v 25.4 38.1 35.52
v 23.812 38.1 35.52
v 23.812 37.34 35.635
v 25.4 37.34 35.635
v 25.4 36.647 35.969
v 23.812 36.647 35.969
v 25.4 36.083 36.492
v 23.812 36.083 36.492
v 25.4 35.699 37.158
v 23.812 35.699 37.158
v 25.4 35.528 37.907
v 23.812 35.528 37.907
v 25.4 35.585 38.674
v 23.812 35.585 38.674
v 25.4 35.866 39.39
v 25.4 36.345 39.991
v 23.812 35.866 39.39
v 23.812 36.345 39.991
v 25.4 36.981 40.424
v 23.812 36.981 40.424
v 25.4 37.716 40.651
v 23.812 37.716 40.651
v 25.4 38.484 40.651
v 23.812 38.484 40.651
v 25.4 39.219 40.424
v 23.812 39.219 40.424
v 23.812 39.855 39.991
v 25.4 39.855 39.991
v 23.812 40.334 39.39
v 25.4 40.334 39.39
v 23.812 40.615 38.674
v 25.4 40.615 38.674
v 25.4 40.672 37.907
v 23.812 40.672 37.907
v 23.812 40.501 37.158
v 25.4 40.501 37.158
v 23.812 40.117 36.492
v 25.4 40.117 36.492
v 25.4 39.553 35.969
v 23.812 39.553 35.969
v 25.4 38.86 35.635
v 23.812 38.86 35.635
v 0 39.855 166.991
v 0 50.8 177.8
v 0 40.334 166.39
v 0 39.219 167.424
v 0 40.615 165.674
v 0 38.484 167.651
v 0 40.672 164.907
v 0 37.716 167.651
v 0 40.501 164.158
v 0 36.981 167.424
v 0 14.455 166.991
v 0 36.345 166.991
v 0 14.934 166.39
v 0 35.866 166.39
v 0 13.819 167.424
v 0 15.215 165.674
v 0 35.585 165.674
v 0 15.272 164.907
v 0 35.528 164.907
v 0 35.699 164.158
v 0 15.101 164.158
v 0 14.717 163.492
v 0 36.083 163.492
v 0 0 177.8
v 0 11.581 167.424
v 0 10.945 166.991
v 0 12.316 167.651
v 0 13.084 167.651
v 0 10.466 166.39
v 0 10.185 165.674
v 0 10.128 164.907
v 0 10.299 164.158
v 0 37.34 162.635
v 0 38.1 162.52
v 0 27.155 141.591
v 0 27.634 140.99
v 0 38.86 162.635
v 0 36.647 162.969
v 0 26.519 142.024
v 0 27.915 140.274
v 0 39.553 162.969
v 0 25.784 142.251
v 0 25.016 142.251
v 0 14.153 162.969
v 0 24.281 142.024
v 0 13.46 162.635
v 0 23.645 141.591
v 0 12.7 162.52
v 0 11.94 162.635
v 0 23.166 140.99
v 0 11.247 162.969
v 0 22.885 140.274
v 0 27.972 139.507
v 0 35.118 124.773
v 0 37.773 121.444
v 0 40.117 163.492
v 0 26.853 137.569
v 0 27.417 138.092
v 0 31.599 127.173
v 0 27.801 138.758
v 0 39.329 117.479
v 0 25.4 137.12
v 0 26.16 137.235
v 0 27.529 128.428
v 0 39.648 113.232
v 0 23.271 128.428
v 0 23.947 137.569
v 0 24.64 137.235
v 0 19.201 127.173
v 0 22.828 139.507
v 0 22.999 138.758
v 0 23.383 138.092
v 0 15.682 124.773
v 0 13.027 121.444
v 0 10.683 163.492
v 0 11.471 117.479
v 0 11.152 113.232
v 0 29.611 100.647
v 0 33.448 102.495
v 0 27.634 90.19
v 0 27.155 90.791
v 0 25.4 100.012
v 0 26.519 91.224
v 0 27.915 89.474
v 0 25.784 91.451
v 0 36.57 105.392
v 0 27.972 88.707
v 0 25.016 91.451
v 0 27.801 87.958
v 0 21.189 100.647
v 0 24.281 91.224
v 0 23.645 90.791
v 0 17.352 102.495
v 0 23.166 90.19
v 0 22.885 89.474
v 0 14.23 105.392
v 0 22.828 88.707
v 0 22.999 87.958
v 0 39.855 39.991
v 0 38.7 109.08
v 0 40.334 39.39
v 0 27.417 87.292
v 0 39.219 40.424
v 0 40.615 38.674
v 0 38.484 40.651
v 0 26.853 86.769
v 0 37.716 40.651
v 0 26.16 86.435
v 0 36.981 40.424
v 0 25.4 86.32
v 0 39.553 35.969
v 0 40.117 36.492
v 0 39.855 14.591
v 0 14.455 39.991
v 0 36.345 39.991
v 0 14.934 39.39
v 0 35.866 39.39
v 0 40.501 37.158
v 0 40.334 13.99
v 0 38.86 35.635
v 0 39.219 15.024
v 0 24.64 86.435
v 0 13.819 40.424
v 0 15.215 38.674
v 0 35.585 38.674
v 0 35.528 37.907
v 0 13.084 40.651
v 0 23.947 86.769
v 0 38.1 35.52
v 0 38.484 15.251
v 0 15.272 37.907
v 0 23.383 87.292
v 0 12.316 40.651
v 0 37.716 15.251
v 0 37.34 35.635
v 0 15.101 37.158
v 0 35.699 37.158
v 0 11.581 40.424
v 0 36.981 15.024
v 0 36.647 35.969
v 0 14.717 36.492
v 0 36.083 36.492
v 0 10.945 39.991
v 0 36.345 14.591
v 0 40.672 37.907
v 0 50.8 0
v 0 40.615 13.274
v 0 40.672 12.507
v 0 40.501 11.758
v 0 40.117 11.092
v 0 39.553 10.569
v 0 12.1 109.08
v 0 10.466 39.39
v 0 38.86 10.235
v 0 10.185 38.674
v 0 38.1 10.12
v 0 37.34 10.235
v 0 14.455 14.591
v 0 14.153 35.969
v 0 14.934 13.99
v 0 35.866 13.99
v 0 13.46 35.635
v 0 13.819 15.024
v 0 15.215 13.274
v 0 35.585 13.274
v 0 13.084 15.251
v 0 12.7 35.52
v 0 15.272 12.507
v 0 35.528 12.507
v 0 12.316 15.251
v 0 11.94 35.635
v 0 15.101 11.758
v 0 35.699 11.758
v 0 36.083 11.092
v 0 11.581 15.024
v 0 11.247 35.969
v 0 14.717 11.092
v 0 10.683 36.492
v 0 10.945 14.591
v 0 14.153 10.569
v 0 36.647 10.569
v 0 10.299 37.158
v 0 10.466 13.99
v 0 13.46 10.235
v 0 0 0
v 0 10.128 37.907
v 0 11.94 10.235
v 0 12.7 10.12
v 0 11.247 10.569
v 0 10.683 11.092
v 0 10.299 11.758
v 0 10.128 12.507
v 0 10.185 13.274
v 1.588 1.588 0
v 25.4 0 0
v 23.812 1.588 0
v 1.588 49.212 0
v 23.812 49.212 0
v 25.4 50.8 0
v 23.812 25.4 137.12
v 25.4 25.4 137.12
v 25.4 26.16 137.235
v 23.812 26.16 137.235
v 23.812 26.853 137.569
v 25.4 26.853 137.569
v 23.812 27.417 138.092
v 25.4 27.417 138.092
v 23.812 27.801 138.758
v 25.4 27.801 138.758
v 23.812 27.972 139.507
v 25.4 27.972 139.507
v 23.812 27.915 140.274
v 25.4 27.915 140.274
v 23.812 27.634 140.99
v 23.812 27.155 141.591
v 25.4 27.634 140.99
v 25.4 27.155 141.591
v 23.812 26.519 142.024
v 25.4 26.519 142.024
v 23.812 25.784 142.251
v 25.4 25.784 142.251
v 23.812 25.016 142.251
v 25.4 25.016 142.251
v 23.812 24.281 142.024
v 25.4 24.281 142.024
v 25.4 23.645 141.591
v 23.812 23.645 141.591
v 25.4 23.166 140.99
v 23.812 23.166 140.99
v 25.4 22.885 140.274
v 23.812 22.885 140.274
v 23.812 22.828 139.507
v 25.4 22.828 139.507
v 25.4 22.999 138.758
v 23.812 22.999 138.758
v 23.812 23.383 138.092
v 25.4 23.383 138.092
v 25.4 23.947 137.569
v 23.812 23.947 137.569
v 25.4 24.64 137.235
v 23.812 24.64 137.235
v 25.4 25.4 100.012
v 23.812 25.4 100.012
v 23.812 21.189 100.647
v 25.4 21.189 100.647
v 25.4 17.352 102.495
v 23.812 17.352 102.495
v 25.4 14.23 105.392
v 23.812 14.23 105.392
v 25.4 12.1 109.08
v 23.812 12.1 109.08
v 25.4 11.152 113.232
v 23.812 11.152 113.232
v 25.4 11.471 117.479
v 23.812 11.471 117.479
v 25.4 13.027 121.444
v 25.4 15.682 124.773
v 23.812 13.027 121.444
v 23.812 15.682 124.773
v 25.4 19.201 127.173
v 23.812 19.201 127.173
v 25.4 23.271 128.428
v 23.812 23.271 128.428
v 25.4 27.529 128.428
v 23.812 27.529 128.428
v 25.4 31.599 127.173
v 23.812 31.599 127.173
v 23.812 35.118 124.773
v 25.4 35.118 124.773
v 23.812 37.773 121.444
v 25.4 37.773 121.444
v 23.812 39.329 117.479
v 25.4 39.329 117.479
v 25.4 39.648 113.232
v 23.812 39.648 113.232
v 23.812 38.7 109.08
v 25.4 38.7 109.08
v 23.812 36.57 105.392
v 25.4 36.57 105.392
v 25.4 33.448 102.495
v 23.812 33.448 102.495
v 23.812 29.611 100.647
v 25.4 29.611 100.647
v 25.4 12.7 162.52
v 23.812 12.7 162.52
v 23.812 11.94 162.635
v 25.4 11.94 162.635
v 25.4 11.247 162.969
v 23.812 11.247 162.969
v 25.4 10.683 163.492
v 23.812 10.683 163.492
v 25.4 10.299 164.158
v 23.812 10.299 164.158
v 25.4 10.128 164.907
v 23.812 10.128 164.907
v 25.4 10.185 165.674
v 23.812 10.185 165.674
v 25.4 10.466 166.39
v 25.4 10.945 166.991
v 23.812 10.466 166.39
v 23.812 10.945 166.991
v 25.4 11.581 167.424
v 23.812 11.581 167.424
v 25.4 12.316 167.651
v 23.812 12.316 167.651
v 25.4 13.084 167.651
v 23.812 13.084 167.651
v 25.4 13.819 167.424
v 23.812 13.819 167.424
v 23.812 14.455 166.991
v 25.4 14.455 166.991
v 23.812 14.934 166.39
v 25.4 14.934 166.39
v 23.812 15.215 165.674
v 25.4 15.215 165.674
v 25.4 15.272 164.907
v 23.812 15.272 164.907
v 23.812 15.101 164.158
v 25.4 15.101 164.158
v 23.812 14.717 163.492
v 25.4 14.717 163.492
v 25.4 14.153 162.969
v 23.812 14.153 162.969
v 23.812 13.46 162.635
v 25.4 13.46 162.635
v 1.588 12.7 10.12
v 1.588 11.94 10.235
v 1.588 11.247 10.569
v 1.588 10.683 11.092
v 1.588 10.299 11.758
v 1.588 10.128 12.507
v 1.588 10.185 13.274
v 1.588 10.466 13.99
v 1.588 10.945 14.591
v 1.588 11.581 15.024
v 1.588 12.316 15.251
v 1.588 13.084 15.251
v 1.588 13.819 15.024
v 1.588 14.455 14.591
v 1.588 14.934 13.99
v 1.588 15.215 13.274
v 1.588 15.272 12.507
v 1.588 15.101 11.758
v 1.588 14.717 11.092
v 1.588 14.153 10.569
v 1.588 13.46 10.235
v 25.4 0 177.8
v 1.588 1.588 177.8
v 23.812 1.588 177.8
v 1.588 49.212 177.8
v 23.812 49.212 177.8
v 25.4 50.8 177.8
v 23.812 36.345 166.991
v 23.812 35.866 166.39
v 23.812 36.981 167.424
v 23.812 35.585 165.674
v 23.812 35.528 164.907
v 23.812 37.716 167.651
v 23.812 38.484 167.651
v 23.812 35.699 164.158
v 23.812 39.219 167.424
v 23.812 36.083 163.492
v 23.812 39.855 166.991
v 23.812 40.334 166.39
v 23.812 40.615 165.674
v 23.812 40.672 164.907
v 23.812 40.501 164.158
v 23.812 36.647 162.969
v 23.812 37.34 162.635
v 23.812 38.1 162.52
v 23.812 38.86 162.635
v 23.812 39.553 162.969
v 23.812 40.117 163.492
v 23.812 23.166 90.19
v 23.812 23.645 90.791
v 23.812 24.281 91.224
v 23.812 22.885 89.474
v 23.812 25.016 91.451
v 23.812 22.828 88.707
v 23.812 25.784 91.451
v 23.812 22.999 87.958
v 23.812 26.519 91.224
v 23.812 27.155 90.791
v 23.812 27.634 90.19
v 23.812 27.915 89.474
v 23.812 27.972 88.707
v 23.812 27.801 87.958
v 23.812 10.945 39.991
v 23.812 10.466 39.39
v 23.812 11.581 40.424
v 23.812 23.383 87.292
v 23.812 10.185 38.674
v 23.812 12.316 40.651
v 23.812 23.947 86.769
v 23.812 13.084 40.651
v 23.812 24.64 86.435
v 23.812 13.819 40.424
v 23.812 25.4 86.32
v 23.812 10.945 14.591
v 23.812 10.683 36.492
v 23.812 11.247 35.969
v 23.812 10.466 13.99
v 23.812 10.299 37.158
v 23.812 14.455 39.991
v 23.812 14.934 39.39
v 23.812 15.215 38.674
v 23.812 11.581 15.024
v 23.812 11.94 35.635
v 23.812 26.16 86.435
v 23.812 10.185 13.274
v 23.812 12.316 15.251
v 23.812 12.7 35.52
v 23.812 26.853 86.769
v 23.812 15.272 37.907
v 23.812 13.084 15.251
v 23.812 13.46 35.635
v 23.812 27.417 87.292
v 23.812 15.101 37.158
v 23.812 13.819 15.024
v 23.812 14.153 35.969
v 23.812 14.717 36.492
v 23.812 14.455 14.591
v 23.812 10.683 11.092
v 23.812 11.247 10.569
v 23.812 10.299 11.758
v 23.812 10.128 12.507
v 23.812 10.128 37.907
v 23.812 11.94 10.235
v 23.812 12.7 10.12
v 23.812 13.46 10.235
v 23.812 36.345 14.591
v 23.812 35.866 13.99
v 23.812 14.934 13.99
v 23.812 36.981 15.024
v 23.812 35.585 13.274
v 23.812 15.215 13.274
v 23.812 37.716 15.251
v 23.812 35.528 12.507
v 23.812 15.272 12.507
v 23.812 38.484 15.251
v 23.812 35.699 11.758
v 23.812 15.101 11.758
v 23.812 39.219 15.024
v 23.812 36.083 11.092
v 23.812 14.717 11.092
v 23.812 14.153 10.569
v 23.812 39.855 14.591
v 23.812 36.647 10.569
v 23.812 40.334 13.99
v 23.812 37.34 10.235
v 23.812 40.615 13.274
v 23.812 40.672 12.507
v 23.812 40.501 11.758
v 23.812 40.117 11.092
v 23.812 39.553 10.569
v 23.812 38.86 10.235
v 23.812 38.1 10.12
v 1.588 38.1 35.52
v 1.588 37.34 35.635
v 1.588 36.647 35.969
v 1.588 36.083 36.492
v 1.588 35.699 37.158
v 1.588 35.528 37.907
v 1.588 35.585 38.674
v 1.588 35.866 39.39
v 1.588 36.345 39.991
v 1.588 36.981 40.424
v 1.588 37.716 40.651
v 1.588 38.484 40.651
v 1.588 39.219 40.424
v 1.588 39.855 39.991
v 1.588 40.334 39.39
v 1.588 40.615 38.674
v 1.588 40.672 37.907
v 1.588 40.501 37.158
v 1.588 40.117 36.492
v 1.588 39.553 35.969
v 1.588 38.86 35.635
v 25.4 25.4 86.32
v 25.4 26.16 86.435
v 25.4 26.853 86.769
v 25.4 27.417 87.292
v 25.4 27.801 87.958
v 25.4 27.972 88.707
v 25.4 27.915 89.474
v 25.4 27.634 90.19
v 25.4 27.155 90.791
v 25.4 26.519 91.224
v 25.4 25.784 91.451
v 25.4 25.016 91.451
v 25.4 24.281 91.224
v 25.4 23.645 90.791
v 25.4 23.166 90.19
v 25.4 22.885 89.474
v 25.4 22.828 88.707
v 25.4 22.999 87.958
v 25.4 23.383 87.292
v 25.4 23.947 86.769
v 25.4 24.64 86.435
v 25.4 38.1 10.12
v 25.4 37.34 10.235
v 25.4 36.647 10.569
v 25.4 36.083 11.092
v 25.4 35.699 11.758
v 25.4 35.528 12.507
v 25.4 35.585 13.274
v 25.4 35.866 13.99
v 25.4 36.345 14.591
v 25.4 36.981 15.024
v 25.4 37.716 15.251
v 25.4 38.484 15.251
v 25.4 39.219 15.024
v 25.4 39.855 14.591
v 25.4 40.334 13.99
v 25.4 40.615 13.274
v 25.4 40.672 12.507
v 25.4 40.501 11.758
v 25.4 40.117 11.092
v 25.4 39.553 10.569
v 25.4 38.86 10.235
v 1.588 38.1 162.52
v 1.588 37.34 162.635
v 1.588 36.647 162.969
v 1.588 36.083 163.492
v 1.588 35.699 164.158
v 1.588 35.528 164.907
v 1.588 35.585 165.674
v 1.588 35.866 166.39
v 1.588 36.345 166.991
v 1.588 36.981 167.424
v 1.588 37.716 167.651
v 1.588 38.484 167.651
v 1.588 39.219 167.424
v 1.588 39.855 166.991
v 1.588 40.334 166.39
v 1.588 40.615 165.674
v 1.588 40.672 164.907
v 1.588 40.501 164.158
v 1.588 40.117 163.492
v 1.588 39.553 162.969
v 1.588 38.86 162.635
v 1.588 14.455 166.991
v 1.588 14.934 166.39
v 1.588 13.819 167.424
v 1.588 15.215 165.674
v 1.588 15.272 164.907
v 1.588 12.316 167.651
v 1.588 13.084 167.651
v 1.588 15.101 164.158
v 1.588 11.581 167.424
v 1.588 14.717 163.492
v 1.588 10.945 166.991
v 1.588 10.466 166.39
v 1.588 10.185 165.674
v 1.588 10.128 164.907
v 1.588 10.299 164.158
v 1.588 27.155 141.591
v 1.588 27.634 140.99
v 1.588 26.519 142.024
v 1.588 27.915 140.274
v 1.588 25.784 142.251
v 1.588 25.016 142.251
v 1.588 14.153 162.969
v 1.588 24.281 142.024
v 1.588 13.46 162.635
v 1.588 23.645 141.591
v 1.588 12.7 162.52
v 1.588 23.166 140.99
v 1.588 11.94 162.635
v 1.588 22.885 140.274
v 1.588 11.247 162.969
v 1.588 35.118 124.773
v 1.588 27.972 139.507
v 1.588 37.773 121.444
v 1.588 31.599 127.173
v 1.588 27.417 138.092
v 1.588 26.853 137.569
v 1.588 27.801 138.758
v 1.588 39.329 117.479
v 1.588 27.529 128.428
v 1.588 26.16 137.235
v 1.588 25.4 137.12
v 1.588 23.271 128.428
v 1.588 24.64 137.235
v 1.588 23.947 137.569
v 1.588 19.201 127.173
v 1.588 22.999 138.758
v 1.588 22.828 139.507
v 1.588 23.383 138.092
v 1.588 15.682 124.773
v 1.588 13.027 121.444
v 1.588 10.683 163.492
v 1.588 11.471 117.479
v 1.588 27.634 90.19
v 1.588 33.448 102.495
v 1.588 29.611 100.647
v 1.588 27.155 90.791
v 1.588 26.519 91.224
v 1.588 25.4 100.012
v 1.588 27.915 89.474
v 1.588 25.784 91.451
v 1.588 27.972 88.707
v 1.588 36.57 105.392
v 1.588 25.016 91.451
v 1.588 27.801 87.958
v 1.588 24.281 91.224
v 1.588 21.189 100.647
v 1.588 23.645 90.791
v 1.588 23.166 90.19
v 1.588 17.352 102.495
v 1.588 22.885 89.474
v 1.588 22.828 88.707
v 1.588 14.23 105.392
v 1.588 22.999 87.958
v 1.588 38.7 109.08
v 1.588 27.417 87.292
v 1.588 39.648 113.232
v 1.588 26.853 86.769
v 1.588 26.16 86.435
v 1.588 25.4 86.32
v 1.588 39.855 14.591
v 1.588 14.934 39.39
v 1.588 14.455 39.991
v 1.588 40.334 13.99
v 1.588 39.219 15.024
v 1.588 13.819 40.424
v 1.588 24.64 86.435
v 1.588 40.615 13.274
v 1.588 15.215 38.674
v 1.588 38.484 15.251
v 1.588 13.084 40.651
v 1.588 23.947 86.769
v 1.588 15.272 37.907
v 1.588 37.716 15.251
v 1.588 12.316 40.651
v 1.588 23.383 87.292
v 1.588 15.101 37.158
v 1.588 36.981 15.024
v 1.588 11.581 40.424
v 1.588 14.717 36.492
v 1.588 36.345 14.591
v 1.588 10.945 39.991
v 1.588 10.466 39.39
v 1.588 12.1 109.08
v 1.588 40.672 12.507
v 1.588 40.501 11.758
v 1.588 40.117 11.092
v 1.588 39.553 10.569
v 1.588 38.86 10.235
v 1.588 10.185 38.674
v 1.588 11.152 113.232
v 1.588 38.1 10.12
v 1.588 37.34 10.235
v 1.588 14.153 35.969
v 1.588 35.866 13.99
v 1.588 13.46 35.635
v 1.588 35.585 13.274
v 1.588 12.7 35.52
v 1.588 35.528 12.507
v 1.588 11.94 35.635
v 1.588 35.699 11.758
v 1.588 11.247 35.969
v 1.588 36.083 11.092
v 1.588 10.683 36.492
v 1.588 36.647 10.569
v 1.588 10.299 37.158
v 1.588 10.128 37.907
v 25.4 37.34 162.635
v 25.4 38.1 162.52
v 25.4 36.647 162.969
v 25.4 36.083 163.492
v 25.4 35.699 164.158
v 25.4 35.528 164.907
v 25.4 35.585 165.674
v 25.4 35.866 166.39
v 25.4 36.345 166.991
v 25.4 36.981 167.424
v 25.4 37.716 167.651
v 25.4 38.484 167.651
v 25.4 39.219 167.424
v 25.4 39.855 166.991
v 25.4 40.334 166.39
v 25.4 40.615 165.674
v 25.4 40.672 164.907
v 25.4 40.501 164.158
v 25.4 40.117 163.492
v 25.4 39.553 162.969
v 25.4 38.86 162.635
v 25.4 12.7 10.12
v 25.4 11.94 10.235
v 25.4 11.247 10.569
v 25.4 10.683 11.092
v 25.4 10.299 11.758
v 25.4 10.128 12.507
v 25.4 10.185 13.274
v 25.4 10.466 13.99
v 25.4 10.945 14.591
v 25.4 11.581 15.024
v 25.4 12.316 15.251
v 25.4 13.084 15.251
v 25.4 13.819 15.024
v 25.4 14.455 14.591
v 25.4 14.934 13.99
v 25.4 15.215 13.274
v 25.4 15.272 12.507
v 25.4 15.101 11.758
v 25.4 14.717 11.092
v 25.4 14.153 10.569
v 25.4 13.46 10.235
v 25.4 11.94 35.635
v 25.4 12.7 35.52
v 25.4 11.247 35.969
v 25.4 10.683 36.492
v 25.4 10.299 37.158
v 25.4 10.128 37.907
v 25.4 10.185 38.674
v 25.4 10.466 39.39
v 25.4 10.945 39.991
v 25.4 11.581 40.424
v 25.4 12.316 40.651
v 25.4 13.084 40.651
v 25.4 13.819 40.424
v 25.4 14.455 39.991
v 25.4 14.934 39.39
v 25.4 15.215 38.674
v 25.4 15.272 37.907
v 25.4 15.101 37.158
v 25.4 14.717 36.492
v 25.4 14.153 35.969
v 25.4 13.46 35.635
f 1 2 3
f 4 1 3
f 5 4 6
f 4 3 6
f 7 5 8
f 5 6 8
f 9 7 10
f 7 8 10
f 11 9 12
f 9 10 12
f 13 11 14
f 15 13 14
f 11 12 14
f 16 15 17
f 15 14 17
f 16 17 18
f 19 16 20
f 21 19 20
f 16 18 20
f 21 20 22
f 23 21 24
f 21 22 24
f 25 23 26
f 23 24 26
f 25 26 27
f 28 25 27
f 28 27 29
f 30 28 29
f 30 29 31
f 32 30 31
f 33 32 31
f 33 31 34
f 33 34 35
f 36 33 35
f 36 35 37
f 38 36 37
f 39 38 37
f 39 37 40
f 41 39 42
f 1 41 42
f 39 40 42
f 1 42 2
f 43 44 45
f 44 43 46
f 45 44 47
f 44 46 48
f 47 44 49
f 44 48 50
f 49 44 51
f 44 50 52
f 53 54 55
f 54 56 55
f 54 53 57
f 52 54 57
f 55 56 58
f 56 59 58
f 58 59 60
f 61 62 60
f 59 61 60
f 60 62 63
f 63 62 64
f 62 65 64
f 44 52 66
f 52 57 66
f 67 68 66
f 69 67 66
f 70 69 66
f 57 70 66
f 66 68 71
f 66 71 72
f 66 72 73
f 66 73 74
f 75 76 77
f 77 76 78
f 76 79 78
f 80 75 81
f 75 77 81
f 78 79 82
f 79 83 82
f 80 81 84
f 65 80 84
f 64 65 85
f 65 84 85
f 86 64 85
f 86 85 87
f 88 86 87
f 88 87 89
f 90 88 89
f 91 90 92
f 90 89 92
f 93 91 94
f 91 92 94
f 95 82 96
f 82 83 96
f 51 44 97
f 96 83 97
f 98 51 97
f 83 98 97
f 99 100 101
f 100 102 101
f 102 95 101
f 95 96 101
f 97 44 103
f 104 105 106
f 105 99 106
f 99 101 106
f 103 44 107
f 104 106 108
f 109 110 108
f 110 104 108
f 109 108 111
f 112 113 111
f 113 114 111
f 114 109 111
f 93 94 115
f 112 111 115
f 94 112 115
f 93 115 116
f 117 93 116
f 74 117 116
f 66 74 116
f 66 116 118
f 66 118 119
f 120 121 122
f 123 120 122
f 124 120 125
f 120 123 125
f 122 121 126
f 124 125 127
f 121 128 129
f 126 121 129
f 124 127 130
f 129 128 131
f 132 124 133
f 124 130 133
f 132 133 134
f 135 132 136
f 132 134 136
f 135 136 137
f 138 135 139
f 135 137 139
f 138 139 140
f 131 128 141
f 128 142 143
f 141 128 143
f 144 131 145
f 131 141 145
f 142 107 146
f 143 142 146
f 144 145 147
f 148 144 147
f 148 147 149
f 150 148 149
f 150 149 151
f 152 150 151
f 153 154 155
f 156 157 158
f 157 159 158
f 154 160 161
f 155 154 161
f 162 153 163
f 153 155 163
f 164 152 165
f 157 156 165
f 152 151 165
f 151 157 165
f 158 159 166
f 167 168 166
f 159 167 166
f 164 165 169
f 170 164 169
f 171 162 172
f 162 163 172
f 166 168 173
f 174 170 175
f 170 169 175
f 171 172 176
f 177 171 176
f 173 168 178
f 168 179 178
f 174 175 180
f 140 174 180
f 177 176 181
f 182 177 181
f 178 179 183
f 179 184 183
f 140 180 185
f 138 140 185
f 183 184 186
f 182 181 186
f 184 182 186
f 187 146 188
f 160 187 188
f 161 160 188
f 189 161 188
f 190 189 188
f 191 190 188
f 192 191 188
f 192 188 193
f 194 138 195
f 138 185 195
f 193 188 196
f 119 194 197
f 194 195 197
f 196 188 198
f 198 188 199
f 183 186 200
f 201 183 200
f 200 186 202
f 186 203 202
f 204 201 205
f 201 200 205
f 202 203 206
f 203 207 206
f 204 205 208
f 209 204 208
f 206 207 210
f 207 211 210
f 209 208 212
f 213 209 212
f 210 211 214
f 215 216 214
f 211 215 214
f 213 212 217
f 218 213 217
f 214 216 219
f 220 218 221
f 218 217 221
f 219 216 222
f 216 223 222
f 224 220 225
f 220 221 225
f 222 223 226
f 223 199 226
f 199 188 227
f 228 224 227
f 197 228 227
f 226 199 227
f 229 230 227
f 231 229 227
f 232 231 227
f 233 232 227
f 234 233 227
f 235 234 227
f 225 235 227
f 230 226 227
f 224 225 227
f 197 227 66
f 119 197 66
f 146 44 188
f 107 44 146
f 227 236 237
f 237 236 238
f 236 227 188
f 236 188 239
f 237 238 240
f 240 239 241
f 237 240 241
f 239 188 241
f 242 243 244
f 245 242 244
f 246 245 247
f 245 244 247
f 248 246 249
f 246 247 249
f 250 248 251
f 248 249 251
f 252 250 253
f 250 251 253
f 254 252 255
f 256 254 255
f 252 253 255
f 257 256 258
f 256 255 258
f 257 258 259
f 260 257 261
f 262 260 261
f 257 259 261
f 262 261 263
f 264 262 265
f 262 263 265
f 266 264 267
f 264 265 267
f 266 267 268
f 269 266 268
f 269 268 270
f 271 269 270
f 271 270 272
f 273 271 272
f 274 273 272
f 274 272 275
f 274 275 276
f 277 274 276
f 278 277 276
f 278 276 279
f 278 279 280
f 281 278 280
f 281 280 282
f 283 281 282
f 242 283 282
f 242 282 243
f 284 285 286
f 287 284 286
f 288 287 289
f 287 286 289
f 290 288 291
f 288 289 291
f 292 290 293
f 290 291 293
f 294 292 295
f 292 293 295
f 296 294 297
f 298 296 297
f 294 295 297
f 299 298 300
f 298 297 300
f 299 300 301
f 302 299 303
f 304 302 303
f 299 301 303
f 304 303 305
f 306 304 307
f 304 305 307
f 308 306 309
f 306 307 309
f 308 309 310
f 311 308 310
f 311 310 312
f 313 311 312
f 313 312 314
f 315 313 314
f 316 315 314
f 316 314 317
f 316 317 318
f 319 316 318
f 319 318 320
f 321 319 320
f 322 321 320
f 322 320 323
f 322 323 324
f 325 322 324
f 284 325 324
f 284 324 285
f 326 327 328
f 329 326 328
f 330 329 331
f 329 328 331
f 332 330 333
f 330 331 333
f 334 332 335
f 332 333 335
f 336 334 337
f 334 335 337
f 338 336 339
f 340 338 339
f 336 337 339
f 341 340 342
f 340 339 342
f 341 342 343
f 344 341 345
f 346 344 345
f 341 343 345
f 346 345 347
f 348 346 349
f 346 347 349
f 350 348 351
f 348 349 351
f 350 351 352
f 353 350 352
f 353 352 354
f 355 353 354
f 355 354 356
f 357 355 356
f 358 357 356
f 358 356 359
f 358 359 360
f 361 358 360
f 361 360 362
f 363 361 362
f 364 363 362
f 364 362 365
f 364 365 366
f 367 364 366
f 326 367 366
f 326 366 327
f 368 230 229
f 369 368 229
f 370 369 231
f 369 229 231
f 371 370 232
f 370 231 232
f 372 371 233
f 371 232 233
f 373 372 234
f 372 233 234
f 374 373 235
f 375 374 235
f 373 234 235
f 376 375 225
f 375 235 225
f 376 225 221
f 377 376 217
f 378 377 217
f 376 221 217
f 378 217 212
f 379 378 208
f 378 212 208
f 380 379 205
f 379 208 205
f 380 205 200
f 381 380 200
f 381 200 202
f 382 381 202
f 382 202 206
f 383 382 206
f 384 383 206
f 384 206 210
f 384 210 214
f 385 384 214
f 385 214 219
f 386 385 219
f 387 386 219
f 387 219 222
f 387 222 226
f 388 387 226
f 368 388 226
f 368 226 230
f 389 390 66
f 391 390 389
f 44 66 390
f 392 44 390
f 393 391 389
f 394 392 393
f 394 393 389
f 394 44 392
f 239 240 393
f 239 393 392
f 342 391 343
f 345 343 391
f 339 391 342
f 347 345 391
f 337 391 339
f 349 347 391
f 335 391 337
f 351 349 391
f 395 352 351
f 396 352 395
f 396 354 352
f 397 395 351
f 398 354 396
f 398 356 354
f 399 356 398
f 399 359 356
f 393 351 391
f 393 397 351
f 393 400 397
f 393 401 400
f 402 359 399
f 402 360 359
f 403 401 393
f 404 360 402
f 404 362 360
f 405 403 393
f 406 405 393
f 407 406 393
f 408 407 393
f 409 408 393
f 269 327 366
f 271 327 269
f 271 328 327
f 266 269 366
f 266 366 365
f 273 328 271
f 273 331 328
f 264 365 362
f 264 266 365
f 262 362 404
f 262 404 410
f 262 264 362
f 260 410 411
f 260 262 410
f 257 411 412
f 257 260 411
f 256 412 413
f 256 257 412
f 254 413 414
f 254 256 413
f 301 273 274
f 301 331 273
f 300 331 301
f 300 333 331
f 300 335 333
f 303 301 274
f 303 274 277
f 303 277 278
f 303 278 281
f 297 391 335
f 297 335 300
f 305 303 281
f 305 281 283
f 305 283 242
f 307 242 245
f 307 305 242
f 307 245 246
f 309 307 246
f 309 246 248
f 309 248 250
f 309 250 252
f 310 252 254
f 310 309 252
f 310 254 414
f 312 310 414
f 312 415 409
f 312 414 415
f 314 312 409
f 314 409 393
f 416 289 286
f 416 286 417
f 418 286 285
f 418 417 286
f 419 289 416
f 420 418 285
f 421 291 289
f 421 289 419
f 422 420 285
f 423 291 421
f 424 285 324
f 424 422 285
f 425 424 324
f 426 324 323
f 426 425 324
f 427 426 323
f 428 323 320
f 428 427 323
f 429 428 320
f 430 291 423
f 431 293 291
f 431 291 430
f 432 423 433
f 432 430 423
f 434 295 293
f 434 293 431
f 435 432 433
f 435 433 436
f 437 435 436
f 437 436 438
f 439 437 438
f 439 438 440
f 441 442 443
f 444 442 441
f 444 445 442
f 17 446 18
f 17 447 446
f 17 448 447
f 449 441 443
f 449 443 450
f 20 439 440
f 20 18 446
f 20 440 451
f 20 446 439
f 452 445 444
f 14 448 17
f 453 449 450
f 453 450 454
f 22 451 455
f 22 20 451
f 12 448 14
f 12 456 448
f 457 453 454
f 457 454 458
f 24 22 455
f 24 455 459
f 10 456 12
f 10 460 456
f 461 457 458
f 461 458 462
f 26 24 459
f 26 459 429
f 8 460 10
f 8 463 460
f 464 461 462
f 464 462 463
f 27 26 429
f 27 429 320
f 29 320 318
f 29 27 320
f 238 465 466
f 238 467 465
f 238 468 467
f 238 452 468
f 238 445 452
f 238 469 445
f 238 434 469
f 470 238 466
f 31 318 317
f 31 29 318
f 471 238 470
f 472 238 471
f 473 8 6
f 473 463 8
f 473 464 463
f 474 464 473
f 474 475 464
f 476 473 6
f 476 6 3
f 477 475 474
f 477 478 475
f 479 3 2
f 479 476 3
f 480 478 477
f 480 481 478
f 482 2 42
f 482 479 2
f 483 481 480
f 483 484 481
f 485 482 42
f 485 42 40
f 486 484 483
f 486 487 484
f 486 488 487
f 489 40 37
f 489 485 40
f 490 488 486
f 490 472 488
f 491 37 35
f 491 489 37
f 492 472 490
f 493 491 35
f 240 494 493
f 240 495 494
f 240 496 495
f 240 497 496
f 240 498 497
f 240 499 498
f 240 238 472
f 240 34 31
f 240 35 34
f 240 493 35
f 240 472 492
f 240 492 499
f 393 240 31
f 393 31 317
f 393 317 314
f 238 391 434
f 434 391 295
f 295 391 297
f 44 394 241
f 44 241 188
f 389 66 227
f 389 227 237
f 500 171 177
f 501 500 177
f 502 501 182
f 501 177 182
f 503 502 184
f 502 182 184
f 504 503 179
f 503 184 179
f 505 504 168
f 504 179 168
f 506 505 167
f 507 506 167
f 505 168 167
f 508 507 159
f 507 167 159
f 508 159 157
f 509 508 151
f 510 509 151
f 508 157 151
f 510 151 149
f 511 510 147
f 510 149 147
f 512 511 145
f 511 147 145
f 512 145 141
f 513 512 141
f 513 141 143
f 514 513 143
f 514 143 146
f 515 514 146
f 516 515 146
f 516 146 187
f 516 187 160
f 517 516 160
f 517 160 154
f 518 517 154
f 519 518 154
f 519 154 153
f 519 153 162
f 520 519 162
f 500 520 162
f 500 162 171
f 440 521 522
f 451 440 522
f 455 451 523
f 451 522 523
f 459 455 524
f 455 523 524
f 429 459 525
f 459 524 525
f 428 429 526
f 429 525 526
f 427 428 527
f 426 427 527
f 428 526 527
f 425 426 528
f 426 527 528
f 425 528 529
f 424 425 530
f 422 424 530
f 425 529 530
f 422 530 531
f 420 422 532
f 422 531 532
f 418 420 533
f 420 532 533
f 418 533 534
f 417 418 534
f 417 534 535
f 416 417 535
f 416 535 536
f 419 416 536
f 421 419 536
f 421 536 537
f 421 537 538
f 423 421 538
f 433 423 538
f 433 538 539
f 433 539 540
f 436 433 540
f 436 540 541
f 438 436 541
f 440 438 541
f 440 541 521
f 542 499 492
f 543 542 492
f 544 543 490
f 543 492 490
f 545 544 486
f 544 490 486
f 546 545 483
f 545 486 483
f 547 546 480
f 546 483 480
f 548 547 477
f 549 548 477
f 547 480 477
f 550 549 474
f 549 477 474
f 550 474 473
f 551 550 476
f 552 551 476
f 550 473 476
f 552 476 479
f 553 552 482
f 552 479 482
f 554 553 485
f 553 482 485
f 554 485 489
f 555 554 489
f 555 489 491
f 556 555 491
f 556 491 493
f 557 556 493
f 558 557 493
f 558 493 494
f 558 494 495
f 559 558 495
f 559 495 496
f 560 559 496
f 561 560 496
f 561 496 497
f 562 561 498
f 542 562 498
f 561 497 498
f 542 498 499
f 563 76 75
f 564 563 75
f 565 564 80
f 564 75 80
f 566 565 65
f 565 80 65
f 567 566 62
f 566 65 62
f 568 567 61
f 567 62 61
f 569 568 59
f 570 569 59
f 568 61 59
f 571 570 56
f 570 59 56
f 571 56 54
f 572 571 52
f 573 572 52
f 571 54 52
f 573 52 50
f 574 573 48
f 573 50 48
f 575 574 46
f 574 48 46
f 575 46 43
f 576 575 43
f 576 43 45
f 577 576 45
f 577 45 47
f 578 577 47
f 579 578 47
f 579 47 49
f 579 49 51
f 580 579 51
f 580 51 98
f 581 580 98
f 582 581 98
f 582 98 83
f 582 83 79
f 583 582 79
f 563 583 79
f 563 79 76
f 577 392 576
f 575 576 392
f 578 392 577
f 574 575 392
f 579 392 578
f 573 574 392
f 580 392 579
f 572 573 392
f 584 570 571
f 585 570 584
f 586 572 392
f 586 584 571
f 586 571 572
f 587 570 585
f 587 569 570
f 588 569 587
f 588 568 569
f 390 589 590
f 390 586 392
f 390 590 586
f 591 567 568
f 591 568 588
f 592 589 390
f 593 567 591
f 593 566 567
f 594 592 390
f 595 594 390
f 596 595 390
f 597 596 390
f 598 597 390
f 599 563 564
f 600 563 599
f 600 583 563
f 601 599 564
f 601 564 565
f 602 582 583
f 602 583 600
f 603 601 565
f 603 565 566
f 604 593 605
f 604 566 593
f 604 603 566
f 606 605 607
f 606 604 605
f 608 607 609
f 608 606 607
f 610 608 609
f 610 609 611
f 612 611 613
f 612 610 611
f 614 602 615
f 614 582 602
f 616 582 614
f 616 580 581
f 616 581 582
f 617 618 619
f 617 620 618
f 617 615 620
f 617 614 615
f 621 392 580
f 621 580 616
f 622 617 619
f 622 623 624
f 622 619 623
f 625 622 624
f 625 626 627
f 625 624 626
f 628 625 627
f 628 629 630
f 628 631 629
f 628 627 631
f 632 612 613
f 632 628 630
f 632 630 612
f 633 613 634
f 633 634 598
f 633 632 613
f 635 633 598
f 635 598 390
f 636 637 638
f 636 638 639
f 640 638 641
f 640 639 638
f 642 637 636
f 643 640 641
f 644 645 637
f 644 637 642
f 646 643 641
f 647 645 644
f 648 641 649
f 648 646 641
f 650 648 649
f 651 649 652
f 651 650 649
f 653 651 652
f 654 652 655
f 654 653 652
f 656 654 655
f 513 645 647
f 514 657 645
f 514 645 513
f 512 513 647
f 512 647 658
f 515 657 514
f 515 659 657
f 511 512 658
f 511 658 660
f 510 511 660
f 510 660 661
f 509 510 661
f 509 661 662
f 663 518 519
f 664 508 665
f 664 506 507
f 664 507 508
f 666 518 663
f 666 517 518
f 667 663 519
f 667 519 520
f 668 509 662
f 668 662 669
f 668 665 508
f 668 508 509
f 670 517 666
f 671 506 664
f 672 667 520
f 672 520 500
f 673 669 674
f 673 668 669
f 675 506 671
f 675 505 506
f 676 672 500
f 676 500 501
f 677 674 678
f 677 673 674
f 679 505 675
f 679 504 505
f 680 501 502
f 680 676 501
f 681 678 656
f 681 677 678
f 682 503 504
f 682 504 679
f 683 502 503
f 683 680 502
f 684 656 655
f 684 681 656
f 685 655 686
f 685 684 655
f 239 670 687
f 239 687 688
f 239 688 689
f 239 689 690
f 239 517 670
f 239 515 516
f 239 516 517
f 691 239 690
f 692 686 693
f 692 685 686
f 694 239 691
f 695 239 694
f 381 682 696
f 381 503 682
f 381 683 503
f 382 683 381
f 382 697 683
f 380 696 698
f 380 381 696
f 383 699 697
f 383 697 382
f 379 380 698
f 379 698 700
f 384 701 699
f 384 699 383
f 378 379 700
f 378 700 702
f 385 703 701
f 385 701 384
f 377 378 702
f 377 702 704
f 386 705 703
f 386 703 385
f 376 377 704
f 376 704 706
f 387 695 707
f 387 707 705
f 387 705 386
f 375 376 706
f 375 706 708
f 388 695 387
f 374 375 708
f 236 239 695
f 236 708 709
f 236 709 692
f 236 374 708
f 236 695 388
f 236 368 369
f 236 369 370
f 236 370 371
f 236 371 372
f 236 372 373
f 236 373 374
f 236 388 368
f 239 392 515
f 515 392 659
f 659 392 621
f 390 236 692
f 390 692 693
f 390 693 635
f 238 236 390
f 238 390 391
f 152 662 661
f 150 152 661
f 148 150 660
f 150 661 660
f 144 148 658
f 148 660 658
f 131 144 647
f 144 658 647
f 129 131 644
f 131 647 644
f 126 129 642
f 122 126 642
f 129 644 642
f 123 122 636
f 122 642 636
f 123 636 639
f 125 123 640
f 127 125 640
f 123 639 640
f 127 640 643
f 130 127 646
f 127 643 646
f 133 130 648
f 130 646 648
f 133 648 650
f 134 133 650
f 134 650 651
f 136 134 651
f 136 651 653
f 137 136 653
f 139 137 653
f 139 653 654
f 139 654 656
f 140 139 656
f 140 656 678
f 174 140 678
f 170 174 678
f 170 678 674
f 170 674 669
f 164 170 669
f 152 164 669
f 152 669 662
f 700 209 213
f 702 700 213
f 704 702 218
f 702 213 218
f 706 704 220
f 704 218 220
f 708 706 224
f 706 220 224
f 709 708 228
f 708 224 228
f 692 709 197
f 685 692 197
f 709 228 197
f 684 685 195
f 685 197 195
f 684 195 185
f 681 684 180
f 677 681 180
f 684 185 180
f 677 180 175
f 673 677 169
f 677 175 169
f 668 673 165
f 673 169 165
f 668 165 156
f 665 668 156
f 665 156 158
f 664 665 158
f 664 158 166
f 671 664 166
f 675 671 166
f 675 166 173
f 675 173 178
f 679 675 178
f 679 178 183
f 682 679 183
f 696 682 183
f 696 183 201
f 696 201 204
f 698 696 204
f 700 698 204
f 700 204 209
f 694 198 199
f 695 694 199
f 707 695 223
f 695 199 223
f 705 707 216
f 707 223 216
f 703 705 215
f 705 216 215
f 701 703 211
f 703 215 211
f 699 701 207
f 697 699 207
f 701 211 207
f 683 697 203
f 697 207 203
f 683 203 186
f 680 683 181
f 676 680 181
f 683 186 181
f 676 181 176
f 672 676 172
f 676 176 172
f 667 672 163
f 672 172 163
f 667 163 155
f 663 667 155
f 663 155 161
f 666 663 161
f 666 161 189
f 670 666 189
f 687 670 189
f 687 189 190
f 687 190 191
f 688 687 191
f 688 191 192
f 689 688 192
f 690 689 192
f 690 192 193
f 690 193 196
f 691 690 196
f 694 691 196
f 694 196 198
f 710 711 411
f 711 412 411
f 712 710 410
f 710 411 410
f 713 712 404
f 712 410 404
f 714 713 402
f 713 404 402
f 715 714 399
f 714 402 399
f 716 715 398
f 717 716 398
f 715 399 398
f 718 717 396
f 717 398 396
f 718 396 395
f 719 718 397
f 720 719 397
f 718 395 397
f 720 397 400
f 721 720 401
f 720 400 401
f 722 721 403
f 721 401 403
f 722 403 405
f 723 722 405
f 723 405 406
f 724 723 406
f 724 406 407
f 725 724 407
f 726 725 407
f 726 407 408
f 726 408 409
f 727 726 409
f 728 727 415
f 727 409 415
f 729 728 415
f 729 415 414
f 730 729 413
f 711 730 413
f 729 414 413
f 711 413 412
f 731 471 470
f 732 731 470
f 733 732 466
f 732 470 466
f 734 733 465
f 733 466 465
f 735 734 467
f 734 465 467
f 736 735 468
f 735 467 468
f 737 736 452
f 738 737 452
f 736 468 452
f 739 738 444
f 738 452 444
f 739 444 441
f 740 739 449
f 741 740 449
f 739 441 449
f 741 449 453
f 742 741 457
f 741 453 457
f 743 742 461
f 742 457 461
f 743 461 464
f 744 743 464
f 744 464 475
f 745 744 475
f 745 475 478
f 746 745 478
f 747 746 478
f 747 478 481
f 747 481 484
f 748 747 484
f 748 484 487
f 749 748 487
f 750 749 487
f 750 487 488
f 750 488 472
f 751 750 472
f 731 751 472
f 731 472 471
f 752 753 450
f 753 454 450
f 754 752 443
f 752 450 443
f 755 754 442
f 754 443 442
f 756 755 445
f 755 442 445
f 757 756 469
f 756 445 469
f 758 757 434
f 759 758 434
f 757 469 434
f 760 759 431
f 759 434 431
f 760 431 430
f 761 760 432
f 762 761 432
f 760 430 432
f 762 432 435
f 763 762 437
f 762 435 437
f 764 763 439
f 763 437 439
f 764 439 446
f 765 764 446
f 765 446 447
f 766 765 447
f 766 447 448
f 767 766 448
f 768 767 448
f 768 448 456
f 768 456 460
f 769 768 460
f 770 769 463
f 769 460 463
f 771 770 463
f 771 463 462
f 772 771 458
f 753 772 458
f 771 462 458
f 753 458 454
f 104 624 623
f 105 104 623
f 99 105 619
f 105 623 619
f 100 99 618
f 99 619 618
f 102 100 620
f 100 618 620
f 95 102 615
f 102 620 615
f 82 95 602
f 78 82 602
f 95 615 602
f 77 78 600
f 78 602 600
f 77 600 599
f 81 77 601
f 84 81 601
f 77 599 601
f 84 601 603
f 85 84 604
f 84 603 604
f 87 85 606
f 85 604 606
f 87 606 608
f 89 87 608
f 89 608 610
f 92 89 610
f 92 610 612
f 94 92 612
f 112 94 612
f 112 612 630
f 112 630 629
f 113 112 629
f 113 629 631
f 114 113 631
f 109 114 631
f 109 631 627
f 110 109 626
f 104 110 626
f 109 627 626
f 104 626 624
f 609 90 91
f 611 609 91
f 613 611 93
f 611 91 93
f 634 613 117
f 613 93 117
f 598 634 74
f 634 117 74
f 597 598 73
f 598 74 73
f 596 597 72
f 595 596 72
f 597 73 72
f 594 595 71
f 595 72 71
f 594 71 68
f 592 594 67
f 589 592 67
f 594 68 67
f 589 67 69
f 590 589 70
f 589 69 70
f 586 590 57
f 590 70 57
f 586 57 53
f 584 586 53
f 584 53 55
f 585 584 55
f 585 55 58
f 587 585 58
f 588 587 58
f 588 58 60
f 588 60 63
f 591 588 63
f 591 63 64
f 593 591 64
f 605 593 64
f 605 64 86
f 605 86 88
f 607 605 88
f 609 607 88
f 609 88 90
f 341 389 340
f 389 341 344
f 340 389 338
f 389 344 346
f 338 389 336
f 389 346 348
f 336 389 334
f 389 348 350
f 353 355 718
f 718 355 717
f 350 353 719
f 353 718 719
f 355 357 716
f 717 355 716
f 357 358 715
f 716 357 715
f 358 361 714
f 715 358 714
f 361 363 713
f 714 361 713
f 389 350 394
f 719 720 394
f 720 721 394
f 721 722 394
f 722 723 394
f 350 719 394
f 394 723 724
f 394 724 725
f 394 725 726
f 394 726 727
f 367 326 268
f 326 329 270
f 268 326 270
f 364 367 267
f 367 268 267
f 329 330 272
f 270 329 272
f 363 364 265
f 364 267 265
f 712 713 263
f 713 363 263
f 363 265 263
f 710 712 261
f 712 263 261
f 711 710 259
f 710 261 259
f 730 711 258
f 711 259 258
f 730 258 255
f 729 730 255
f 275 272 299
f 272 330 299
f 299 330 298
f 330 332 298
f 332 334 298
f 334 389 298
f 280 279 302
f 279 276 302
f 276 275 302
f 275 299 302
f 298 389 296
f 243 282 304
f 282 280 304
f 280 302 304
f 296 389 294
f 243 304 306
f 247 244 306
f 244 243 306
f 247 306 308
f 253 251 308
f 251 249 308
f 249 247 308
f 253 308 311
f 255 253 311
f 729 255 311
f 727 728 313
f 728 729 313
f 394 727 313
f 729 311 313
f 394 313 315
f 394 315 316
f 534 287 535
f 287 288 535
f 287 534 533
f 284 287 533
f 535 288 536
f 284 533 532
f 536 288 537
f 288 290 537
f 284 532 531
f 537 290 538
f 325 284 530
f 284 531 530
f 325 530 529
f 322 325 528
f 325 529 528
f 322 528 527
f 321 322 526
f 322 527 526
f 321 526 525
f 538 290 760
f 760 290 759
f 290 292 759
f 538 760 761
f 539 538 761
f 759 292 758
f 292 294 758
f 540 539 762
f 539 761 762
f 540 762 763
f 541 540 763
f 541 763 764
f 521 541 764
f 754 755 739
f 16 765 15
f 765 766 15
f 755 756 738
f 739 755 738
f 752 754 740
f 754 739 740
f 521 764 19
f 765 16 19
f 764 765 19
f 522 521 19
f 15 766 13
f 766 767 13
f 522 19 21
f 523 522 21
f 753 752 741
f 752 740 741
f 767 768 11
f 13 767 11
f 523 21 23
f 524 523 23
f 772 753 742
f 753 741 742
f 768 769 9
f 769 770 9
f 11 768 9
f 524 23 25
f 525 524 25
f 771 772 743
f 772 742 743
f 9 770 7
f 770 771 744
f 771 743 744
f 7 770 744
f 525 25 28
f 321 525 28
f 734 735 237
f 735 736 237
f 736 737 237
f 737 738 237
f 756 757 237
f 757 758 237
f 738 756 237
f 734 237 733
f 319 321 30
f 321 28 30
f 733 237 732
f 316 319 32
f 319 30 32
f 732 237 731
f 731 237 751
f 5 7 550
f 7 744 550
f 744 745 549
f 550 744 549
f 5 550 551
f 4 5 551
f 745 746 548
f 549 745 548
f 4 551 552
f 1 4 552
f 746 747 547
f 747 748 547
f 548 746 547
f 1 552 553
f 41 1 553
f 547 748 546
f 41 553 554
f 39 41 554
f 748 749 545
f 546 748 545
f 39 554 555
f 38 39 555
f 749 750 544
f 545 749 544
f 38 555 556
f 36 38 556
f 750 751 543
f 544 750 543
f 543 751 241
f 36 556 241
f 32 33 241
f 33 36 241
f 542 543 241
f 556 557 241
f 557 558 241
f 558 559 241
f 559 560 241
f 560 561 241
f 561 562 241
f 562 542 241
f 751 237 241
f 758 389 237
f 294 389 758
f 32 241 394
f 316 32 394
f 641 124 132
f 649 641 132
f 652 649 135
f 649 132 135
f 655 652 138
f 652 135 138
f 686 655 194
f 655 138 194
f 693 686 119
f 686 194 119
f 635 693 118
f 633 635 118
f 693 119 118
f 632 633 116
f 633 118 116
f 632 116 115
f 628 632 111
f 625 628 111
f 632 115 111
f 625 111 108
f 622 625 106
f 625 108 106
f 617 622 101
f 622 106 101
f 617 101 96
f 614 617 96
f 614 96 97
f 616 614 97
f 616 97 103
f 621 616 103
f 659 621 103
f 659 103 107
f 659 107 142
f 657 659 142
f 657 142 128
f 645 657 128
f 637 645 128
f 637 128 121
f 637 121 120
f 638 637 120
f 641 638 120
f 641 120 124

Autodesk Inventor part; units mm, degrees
ref_plane "YZ Plane" through (0, 0, 0) normal (1, 0, 0) x (0, 1, 0)
ref_plane "XZ Plane" through (0, 0, 0) normal (0, 1, 0) x (-1, 0, 0)
ref_plane "XY Plane" through (0, 0, 0) normal (0, 0, 1) x (1, 0, 0)
sketch "Sketch1" plane through (0, 0, 0) normal (0, 0, 1) x (1, 0, 0)
  line L0 (0, 0) -> (25.4, 0)
  line L1 (25.4, 0) -> (25.4, 50.8)
  line L2 (25.4, 50.8) -> (0, 50.8)
  line L3 (0, 50.8) -> (0, 0)
  dimension "d0" = 25.4
  dimension "d1" = 50.8
extrude "Extrusion1" add sketch "Sketch1" along normal blind 177.8
shell "Shell1" thickness 1.5875 removed faces 2 at (8.4667, 16.9333, 0) at (8.4667, 16.9333, 177.8)
hole "Hole1" at (25.4, 25.4, 114.3) direction (-1, 0, 0) diameter 28.575 end through all
sketch "Sketch2" plane through (25.4, 0, 0) normal (1, 0, 0) x (0, 0, -1)
  line L0 (-177.8, 1.5875) -> (-177.8, 49.2125) projected
  line L1 (-177.8, 25.4) -> (-114.3, 25.4)
  line L2 (-177.8, 25.4) -> (-114.3, 25.4) construction
  line L3 (-114.3, 25.4) -> (-88.9, 25.4)
  line L4 (-114.3, 25.4) -> (-139.7, 25.4)
  circle A0 centre (-139.7, 25.4) radius 2.5797
  circle A1 centre (-88.9, 25.4) radius 2.5797
  point P0 (0, 0)
  dimension "d14" = 63.5
  dimension "d16" = 25.4
  dimension "d17" = 25.4
  dimension "d18" = 5.1594
  dimension "d19" = 5.1594
extrude "Extrusion2" cut sketch "Sketch2" against normal blind 177.8
hole "Hole2" at (25.4, 38.1, 165.1) direction (-1, 0, 0) diameter 5.1594 end through all
hole "Hole3" at (25.4, 12.7, 165.1) direction (-1, 0, 0) diameter 5.1594 end through all
hole "Hole4" at (25.4, 38.1, 12.7) direction (-1, 0, 0) diameter 5.1594 end through all
hole "Hole5" at (25.4, 38.1, 38.1) direction (-1, 0, 0) diameter 5.1594 end through all
hole "Hole6" at (25.4, 12.7, 38.1) direction (-1, 0, 0) diameter 5.1594 end through all
hole "Hole7" at (25.4, 12.7, 12.7) direction (-1, 0, 0) diameter 5.1594 end through all
properties part number "1x2 7 in Beam Motor Mount"
